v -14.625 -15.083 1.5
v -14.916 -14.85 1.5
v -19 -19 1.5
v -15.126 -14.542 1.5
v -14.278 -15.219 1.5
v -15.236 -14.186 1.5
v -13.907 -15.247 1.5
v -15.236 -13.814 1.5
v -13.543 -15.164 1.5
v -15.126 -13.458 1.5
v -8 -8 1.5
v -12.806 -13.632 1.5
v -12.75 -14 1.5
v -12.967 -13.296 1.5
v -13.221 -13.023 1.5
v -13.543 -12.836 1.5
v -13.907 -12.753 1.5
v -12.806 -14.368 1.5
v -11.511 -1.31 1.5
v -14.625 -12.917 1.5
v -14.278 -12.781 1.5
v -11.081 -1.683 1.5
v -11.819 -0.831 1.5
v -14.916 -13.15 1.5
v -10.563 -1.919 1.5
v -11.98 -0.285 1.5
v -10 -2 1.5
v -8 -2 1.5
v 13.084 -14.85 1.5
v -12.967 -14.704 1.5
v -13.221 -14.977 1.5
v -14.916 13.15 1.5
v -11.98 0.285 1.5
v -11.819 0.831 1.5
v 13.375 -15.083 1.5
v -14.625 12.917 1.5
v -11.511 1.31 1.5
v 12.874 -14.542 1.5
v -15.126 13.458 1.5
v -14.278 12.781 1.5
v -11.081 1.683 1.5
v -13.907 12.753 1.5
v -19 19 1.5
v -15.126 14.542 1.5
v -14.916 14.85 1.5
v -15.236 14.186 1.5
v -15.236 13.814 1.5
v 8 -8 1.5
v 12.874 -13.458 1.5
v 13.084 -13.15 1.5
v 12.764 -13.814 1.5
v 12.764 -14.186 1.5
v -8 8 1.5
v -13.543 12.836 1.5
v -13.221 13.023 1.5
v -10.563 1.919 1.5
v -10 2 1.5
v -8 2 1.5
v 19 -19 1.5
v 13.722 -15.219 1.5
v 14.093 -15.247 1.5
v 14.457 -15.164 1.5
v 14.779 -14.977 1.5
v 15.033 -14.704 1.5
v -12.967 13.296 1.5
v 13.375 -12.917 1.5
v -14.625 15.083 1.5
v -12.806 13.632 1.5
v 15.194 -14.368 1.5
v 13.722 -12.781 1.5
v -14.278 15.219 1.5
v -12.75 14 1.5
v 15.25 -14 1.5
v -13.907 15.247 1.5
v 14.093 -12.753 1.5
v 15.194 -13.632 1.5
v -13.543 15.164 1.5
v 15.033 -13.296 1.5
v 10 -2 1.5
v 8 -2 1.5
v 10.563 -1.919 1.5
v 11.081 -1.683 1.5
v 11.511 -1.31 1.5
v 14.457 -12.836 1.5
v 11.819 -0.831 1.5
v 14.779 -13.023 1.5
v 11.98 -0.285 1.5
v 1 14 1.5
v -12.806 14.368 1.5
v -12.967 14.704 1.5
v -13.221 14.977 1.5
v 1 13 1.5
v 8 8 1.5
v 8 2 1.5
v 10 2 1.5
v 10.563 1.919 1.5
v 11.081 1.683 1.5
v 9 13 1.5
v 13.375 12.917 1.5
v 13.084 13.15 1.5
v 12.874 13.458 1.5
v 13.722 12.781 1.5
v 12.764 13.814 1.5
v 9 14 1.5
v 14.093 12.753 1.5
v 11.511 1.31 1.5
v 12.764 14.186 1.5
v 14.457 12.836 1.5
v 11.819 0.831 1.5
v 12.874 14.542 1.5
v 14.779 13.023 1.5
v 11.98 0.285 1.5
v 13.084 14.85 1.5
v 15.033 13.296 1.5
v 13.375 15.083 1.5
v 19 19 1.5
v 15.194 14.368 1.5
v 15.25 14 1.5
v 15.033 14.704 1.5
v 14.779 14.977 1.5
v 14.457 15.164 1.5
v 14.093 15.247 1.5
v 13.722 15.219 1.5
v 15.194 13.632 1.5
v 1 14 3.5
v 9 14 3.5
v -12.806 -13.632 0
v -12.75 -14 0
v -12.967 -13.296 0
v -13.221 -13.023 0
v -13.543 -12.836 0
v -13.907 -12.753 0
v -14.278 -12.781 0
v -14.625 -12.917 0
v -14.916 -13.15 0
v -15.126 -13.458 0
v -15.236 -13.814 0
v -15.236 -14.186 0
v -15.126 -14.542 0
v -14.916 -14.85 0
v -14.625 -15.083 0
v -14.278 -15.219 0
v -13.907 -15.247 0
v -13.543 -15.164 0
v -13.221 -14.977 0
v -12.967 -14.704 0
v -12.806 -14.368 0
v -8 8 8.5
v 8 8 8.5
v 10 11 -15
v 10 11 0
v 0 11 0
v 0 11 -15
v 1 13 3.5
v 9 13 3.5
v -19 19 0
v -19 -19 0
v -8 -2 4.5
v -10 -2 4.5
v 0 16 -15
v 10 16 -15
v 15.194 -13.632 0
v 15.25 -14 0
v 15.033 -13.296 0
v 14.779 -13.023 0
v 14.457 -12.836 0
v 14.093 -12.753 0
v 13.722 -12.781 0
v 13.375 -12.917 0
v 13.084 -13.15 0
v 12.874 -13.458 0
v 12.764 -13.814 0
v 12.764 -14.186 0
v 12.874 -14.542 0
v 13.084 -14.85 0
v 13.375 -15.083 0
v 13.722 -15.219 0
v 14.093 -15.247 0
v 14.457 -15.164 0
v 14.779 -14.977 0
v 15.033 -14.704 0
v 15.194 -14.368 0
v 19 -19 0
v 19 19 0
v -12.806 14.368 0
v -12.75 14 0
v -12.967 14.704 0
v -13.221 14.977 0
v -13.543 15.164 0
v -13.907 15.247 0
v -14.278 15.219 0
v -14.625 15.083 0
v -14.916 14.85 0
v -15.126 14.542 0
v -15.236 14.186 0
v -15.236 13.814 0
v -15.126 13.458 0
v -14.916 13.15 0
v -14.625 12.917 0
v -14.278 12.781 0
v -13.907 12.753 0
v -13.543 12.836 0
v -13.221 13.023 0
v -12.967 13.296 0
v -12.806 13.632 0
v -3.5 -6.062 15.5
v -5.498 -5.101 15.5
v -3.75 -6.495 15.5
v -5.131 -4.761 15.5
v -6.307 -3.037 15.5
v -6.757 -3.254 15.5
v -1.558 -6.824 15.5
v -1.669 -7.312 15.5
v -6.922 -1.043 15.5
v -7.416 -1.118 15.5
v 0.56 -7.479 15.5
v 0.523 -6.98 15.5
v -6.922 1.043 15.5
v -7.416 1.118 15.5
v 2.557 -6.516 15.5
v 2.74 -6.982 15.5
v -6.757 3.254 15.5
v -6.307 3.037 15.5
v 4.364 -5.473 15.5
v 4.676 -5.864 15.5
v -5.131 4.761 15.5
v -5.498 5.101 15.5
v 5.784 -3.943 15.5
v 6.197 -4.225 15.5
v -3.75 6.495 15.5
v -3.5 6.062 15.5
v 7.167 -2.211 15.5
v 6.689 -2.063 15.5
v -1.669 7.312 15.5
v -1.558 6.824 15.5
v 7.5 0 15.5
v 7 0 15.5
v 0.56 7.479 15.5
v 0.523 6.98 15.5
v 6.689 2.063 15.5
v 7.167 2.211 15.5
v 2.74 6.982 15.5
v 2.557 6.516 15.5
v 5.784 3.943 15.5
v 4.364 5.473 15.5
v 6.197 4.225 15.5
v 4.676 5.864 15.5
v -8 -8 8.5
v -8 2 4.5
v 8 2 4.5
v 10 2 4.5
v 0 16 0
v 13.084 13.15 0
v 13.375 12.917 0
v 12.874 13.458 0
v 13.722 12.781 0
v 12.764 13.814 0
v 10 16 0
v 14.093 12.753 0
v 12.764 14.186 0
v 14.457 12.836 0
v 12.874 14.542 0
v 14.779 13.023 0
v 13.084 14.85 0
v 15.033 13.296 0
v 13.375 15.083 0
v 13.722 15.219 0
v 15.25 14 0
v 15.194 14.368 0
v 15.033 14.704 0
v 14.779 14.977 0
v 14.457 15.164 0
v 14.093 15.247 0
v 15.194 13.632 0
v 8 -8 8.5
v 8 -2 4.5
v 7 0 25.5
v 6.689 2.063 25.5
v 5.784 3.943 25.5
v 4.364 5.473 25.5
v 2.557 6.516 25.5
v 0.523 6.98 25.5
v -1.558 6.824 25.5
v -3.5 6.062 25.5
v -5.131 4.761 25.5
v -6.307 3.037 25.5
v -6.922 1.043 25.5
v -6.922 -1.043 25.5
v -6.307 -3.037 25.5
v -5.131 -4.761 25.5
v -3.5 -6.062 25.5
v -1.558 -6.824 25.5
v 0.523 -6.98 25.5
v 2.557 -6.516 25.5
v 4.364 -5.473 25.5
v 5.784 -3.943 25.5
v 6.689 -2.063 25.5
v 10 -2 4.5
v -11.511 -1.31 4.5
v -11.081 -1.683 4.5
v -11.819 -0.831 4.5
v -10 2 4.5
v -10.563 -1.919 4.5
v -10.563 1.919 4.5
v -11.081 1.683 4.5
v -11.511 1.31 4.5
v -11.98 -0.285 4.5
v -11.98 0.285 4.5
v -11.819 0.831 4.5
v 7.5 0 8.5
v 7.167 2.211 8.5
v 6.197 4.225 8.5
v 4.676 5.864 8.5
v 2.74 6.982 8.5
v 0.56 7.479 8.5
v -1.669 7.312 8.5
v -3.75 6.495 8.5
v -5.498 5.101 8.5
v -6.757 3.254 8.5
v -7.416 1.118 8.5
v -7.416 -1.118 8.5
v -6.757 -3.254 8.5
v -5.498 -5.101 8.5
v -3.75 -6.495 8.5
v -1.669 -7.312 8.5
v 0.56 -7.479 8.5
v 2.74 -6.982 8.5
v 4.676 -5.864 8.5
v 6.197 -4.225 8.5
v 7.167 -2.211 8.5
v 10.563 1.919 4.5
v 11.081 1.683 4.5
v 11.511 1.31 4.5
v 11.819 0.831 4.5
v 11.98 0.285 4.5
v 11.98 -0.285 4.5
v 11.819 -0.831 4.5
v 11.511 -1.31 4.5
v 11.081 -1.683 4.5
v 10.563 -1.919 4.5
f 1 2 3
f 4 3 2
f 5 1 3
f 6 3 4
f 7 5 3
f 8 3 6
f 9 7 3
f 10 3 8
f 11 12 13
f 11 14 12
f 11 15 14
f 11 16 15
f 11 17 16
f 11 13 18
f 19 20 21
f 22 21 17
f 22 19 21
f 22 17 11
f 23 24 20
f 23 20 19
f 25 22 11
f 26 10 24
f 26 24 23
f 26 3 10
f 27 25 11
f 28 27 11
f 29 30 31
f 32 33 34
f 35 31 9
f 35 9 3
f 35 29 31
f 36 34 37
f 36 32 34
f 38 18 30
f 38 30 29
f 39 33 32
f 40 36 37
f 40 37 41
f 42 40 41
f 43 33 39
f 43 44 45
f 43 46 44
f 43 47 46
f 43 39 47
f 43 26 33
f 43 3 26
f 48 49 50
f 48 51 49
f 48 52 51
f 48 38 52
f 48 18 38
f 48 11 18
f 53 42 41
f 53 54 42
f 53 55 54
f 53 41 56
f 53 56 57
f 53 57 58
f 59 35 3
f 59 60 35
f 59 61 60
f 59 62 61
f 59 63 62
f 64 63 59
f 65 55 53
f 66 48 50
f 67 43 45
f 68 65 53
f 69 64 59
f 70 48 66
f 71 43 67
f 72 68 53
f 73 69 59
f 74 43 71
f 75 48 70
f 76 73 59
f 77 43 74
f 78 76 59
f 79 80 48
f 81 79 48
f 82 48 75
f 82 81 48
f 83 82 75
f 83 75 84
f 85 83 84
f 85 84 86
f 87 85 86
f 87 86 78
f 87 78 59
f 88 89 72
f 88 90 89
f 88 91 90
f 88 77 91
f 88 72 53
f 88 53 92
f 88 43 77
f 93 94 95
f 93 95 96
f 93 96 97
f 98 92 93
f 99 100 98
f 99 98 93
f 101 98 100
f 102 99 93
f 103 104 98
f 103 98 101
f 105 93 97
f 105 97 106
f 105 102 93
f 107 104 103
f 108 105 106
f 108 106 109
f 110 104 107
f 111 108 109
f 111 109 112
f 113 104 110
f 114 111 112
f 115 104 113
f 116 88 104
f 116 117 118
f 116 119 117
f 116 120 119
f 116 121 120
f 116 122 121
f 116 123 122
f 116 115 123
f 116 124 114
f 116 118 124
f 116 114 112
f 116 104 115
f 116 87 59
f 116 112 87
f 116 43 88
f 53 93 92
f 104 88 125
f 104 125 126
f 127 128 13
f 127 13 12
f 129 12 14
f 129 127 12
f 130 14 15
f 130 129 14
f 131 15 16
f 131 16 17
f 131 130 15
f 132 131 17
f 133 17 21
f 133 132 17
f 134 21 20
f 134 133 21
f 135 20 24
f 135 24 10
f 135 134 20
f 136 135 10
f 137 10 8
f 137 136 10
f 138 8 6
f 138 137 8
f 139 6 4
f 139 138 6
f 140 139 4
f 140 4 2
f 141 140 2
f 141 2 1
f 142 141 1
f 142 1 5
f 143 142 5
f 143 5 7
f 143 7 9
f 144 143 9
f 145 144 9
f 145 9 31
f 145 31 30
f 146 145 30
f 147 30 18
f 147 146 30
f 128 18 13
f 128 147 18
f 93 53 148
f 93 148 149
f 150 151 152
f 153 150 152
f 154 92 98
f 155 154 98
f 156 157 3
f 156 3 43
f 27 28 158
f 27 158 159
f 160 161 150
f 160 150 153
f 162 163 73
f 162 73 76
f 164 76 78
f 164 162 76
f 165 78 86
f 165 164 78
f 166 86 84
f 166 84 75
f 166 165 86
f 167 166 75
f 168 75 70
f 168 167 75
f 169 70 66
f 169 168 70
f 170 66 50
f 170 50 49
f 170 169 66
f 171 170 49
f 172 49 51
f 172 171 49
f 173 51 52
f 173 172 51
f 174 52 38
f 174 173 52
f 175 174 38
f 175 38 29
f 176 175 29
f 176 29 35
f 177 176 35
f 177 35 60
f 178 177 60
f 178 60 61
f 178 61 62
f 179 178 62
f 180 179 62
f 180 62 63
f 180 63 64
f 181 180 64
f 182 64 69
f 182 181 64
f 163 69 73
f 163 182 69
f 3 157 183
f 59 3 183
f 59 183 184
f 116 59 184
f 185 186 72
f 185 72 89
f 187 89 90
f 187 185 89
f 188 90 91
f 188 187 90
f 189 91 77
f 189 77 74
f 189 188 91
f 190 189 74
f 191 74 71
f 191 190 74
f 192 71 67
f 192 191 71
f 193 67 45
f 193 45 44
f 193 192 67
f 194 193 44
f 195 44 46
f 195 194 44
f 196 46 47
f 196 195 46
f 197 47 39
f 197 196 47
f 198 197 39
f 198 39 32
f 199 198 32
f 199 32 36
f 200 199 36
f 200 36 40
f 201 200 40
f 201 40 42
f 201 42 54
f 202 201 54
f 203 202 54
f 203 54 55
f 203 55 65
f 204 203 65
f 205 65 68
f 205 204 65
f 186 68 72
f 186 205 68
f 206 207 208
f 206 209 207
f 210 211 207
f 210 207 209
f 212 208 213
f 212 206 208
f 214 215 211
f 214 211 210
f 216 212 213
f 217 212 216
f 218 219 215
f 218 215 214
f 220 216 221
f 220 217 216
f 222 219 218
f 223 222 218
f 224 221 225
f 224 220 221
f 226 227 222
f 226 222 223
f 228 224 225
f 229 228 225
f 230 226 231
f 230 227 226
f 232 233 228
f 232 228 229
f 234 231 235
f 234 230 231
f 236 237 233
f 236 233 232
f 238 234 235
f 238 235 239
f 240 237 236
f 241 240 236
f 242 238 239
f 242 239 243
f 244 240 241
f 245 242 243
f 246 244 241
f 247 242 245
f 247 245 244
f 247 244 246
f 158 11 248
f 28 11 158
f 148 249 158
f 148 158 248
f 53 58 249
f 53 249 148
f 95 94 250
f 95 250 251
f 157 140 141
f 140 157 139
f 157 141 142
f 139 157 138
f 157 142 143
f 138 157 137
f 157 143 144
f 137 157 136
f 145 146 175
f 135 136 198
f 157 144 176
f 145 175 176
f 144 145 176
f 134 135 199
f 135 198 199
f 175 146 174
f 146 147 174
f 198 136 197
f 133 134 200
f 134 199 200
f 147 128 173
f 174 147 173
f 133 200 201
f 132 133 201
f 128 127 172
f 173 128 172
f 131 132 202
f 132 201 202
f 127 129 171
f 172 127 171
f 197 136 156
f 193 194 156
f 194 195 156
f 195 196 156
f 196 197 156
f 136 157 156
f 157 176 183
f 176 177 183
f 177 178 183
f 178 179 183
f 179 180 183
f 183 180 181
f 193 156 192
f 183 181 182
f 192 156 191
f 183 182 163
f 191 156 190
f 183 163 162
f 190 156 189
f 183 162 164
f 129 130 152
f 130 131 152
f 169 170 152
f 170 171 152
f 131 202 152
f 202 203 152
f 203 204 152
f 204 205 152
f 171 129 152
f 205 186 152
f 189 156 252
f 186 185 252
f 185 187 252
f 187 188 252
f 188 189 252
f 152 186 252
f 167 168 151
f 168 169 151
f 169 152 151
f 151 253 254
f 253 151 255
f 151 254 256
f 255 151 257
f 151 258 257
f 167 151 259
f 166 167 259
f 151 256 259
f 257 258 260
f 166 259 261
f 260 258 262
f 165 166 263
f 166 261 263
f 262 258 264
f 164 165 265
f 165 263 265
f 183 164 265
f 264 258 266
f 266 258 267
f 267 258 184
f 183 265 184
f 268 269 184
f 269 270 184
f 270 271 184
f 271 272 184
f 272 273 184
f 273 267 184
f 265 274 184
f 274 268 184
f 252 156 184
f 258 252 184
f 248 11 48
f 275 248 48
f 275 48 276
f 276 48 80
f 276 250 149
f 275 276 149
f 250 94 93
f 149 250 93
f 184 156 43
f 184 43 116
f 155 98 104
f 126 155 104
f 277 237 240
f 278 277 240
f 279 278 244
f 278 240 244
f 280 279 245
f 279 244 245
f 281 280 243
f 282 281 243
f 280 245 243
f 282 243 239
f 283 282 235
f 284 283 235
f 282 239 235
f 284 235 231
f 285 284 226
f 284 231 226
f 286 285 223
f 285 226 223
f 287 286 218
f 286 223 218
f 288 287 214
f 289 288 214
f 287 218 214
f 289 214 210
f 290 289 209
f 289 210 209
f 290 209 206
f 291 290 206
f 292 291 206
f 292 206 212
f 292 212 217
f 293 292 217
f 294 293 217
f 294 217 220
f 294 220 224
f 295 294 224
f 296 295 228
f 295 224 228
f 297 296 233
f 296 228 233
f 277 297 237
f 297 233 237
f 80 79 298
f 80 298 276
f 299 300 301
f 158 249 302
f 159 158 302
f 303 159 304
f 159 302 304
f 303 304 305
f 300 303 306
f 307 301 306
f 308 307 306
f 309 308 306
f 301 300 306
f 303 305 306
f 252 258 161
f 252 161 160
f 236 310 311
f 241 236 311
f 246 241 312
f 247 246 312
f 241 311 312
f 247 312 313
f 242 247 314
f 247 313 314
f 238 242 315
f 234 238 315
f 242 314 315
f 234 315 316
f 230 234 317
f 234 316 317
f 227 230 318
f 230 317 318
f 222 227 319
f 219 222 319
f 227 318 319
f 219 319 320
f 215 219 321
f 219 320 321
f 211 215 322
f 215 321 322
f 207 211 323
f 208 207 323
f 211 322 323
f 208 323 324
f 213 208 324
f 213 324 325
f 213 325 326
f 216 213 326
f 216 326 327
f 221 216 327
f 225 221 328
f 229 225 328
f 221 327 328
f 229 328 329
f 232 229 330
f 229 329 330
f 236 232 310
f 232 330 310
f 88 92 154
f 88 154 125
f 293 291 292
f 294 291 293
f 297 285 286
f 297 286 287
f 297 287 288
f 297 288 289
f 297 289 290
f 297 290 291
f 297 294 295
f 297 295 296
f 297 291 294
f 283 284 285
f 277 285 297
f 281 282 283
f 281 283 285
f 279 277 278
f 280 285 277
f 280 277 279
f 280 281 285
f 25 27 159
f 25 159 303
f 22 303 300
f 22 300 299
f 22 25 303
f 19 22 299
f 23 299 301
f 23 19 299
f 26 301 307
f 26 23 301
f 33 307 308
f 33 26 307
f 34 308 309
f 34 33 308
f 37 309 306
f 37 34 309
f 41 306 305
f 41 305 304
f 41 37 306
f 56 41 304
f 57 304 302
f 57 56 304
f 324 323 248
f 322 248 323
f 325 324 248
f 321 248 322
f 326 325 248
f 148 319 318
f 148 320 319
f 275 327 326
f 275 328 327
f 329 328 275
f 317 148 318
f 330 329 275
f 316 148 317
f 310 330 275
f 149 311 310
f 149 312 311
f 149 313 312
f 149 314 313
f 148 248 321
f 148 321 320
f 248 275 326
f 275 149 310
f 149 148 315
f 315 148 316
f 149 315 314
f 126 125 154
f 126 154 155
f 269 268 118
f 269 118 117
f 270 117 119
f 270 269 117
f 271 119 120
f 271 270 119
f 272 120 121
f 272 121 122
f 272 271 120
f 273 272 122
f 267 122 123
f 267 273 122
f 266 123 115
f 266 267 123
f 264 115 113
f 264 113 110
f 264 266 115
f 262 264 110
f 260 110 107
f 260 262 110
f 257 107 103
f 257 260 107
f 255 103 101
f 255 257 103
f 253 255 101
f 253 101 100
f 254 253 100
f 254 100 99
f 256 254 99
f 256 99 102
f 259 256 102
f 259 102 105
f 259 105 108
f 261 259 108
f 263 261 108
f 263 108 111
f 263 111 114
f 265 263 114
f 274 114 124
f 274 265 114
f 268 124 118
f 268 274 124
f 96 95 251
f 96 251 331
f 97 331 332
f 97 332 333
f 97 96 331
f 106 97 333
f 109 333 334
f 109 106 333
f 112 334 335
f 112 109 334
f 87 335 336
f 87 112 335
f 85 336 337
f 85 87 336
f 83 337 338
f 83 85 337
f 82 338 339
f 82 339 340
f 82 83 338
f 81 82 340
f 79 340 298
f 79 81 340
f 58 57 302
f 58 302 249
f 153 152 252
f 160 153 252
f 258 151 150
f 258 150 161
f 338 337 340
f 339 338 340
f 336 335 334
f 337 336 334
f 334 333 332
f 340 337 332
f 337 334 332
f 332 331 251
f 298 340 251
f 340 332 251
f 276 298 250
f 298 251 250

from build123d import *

# Parameters (mm, degrees)
SKETCH_1_W      = 38
SKETCH_1_H      = 38
SKETCH_1_R      = 1.25
EXTRUDE_1_DEPTH = 1.5
SKETCH_2_W      = 16
SKETCH_2_H      = 16
EXTRUDE_2_DEPTH = 7
SKETCH_3_R      = 7.5
EXTRUDE_3_DEPTH = 7
EXTRUDE_4_DEPTH = 3
SKETCH_6_W      = 10
SKETCH_6_H      = 5
EXTRUDE_5_DEPTH = 15
SKETCH_7_R      = 7
EXTRUDE_6_DEPTH = 10
SKETCH_8_W      = 8
SKETCH_8_H      = 1
EXTRUDE_7_DEPTH = 2


with BuildPart() as part:
    # 草图1 → 凸台-拉伸1 (new body)
    with BuildSketch(Plane.XY):
        Rectangle(SKETCH_1_W, SKETCH_1_H)
        with Locations((-14, 14)):
            Circle(SKETCH_1_R, mode=Mode.SUBTRACT)
        with Locations((14, 14)):
            Circle(SKETCH_1_R, mode=Mode.SUBTRACT)
        with Locations((14, -14)):
            Circle(SKETCH_1_R, mode=Mode.SUBTRACT)
        with Locations((-14, -14)):
            Circle(SKETCH_1_R, mode=Mode.SUBTRACT)
    extrude(amount=EXTRUDE_1_DEPTH)

    # 草图2 → 凸台-拉伸2 (add)
    with BuildSketch(Plane.XY.offset(1.5)):
        Rectangle(SKETCH_2_W, SKETCH_2_H)
    extrude(amount=EXTRUDE_2_DEPTH)

    # 草图3 → 凸台-拉伸3 (add)
    with BuildSketch(Plane.XY.offset(8.5)):
        Circle(SKETCH_3_R)
    extrude(amount=EXTRUDE_3_DEPTH)

    # 草图5 → 凸台-拉伸4 (add)
    with BuildSketch(Plane.XY.offset(1.5)):
        with BuildLine():
            Line((10, -2), (-10, -2))
            ThreePointArc((-10, -2), (-12, 0), (-10, 2))
            Line((-10, 2), (10, 2))
            ThreePointArc((10, 2), (12, 0), (10, -2))
        make_face()
    extrude(amount=EXTRUDE_4_DEPTH)

    # 草图6 → 凸台-拉伸5 (add)
    with BuildSketch(Plane(origin=(0, 0, 0), x_dir=(-1, 0, 0), z_dir=(0, 0, -1))):
        with Locations((-5, 13.5)):
            Rectangle(SKETCH_6_W, SKETCH_6_H)
    extrude(amount=EXTRUDE_5_DEPTH)

    # 草图7 → 凸台-拉伸6 (add)
    with BuildSketch(Plane.XY.offset(15.5)):
        Circle(SKETCH_7_R)
    extrude(amount=EXTRUDE_6_DEPTH)

    # 草图8 → 凸台-拉伸7 (add)
    with BuildSketch(Plane.XY.offset(1.5)):
        with Locations((5, 13.5)):
            Rectangle(SKETCH_8_W, SKETCH_8_H)
    extrude(amount=EXTRUDE_7_DEPTH)


solid = part.part
